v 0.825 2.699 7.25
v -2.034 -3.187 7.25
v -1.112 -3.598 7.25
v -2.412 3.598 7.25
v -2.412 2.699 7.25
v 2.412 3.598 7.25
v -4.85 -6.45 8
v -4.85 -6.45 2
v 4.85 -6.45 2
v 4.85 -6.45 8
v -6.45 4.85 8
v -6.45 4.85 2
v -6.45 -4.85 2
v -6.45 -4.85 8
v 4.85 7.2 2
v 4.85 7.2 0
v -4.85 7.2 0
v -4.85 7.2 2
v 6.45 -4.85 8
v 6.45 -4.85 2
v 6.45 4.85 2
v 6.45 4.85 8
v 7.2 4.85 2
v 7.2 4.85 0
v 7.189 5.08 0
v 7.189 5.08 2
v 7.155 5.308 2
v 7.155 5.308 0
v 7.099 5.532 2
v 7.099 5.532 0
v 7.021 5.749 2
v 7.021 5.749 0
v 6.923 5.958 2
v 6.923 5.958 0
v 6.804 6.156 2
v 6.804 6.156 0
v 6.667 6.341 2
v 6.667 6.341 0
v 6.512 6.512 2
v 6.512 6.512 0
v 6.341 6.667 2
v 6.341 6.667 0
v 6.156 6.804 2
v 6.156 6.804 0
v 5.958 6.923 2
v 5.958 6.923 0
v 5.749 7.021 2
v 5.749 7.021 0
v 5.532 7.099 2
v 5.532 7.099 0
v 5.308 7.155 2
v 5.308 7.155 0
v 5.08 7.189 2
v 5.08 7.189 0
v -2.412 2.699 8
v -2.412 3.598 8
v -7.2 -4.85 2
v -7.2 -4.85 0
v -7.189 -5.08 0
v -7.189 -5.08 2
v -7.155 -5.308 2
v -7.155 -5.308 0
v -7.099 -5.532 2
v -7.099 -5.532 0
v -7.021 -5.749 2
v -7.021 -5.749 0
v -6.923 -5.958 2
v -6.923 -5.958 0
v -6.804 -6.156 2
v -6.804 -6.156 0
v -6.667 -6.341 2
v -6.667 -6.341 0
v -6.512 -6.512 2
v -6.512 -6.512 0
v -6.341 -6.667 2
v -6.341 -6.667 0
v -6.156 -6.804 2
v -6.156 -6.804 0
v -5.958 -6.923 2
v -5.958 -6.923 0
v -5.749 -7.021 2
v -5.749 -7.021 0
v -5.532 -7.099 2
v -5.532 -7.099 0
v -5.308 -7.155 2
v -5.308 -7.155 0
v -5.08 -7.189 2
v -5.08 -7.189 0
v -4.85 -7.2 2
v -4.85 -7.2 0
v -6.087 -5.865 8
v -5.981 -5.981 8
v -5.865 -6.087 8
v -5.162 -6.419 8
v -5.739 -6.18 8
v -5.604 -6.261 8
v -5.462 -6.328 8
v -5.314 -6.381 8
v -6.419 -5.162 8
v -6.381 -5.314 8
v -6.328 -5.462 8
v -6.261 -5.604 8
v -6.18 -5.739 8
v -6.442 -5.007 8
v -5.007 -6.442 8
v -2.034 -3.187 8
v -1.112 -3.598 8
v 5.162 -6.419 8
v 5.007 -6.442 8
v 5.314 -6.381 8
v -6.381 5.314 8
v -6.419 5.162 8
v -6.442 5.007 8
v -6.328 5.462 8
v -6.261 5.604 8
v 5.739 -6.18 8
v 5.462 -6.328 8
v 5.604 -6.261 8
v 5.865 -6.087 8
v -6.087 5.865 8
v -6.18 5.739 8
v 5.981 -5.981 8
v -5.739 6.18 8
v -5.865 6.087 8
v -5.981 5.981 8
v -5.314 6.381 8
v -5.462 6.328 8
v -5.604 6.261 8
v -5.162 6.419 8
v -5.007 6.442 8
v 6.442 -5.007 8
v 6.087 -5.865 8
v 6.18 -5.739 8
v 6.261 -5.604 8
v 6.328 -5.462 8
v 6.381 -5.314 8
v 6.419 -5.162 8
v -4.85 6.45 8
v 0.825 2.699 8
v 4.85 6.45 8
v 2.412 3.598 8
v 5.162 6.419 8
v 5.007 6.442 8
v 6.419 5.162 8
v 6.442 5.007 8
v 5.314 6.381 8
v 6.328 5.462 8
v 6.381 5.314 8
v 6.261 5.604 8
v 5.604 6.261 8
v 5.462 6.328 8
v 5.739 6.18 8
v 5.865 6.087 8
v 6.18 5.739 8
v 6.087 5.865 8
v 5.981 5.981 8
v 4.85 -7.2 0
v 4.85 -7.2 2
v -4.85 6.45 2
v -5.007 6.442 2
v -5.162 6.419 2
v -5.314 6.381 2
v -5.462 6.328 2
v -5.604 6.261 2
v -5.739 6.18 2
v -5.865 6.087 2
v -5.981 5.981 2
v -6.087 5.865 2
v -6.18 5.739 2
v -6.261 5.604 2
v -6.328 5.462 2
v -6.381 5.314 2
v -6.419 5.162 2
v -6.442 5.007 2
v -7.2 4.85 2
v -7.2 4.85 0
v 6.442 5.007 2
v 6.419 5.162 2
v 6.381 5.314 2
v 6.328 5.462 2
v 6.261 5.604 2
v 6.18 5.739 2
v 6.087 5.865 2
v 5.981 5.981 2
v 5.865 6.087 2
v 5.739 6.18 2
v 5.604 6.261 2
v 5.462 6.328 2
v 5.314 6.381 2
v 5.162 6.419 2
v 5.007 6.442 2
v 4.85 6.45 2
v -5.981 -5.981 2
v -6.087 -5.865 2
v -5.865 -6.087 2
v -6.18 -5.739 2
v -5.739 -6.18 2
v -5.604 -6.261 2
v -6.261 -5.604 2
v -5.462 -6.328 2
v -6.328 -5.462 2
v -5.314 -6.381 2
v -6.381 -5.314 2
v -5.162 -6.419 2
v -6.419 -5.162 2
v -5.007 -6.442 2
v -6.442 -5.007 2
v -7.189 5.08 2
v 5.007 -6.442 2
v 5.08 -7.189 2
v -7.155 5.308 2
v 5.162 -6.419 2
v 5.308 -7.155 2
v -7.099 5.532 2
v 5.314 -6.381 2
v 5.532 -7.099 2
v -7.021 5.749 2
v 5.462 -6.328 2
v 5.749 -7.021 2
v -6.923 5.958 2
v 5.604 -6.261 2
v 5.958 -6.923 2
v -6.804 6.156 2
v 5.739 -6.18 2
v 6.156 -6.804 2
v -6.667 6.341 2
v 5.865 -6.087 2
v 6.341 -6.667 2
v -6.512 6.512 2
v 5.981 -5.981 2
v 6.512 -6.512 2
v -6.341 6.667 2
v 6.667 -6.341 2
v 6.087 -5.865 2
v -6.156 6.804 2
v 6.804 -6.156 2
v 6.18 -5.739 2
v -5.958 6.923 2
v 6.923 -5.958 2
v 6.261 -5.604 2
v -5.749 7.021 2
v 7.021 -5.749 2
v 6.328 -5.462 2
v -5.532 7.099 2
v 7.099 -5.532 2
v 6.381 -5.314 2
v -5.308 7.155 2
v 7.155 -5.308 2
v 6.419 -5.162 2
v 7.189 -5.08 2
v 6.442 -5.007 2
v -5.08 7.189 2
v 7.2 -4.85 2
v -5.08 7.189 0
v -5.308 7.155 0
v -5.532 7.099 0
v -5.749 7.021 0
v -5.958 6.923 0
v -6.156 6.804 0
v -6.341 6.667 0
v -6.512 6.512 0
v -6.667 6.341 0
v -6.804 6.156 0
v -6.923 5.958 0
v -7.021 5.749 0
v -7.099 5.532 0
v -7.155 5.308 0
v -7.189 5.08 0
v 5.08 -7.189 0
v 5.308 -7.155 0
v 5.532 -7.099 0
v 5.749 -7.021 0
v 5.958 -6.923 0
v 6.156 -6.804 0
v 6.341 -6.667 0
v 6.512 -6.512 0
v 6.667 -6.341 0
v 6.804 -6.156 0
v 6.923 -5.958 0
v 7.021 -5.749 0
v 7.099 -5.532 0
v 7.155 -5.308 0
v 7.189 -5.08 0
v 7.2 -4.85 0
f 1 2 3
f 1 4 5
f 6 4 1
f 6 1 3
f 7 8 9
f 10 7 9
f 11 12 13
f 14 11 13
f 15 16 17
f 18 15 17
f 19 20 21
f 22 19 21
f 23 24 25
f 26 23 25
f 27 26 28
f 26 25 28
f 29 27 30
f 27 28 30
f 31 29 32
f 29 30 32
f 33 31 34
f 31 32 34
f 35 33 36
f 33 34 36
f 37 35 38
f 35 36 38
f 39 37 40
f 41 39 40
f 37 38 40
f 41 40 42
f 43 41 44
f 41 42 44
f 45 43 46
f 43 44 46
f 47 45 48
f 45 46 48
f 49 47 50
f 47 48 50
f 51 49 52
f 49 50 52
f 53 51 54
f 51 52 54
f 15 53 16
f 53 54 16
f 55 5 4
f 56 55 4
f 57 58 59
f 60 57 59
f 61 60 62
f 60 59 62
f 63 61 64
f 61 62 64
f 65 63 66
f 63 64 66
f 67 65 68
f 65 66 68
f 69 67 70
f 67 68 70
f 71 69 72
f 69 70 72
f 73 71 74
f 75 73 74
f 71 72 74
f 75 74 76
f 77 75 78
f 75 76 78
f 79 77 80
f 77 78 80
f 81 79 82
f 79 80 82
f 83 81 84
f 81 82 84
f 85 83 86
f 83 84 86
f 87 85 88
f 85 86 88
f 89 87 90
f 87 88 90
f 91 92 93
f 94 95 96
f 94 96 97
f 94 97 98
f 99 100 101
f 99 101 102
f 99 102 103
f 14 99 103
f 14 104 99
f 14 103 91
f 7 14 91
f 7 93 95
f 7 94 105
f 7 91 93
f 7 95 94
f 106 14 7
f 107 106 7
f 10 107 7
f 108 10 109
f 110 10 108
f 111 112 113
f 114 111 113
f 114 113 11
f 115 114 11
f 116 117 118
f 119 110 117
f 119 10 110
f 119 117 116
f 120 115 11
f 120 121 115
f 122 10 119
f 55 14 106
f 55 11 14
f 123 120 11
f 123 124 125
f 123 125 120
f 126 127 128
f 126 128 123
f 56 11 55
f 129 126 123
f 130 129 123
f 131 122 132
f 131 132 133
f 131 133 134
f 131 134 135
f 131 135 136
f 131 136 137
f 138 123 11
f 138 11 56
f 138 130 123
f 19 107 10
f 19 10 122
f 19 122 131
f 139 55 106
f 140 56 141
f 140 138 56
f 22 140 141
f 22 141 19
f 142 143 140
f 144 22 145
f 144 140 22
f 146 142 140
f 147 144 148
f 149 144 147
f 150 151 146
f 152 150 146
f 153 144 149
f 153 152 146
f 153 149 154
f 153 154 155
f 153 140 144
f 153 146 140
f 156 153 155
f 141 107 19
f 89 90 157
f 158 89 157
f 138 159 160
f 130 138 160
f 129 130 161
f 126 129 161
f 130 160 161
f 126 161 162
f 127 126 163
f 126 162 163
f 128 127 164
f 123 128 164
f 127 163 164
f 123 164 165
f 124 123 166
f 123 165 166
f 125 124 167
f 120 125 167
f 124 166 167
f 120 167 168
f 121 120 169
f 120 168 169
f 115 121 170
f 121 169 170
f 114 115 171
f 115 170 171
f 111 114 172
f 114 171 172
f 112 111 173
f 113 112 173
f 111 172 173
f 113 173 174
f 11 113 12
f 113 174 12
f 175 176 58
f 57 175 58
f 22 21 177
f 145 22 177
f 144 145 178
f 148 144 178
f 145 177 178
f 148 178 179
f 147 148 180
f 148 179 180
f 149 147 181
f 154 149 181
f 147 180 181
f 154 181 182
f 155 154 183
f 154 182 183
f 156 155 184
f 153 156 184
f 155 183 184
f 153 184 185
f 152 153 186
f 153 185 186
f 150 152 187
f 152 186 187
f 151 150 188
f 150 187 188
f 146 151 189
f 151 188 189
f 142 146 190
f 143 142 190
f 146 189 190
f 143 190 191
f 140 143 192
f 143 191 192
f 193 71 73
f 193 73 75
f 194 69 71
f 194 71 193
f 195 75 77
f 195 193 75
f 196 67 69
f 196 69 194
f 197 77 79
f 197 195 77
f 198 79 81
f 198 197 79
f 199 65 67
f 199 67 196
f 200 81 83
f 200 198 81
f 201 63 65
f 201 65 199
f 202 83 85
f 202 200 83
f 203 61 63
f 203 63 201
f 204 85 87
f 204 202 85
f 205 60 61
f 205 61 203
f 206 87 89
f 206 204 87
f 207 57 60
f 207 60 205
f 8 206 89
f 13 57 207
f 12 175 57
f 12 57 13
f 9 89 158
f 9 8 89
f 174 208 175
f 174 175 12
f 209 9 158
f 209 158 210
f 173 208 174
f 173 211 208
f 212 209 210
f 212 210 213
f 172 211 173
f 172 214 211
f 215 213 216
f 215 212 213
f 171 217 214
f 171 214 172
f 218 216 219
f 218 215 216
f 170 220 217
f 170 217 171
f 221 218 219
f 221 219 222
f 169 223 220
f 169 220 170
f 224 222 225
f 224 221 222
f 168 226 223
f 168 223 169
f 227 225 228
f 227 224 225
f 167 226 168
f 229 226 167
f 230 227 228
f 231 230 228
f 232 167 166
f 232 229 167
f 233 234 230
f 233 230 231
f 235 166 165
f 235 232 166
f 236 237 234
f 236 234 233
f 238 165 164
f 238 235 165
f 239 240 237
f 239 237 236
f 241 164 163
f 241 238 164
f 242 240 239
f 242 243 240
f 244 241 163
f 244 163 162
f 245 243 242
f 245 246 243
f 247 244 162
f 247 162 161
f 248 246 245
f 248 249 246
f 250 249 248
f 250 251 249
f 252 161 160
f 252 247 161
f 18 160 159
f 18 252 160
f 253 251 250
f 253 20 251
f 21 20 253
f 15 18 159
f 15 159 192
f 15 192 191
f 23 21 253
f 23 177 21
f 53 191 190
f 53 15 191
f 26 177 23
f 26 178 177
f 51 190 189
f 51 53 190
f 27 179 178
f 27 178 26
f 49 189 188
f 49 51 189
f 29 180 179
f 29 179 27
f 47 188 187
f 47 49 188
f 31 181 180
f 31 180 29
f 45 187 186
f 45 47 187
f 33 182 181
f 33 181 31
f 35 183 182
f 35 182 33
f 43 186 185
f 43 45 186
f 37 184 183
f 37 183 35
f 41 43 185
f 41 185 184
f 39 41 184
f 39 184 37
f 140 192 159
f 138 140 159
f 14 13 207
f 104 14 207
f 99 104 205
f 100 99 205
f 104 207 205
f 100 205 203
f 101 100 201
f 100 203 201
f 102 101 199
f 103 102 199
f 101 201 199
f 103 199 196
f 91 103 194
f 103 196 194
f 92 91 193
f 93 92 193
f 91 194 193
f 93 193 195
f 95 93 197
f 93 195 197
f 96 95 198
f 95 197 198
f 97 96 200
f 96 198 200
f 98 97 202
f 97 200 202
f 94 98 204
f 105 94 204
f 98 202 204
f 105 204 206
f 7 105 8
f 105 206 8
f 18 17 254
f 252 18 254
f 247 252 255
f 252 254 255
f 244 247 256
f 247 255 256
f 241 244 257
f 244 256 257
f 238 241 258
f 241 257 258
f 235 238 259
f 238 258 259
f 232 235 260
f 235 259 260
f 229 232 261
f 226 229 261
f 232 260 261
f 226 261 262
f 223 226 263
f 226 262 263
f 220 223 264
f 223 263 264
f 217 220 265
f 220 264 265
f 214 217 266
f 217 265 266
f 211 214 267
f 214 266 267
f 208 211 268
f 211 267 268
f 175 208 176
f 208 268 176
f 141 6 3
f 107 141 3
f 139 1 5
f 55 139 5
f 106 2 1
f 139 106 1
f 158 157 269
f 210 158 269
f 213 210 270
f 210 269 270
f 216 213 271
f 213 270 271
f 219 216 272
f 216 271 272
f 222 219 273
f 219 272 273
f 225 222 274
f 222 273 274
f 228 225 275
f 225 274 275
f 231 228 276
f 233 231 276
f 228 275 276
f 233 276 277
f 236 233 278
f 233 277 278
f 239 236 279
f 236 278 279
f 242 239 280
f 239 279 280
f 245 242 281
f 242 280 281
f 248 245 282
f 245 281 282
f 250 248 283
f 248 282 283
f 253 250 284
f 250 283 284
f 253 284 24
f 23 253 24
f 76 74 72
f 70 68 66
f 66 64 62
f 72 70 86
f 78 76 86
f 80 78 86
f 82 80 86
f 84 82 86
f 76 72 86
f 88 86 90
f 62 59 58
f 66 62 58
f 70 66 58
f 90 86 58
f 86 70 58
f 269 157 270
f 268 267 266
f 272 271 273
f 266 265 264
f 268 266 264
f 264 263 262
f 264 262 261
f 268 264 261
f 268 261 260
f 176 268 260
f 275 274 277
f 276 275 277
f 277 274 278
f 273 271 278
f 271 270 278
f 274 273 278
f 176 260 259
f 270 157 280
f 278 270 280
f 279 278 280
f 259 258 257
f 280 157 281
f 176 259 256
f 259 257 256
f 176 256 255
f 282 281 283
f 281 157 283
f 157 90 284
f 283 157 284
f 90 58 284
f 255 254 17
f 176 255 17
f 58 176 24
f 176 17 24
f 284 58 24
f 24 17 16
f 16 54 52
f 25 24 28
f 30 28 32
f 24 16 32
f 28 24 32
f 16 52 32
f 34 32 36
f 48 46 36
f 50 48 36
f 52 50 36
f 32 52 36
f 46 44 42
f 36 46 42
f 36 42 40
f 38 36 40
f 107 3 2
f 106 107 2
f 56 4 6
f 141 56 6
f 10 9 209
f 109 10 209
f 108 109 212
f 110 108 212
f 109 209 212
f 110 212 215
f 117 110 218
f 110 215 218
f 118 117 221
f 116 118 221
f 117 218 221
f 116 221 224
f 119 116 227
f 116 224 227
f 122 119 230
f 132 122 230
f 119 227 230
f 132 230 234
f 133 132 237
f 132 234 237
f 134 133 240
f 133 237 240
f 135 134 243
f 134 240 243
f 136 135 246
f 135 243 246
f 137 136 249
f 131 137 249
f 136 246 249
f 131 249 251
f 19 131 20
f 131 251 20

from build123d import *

# Parameters (mm, degrees)
F1_DEPTH = 2
F2_DEPTH = 8
F3_DEPTH = 7.25


with BuildPart() as f1:
    # F0 (on Top) → F1 (new body)
    with BuildSketch(Plane.XY):
        with BuildLine():
            Line((4.85, 7.2), (-4.85, 7.2))
            ThreePointArc((-4.85, 7.2), (-6.511701, 6.511701), (-7.2, 4.85))
            Line((-7.2, 4.85), (-7.2, -4.85))
            ThreePointArc((-7.2, -4.85), (-6.511701, -6.511701), (-4.85, -7.2))
            Line((-4.85, -7.2), (4.85, -7.2))
            ThreePointArc((4.85, -7.2), (6.511701, -6.511701), (7.2, -4.85))
            Line((7.2, -4.85), (7.2, 4.85))
            ThreePointArc((7.2, 4.85), (6.511701, 6.511701), (4.85, 7.2))
        make_face()
        with BuildLine():
            ThreePointArc((6.45, -4.85), (5.981371, -5.981371), (4.85, -6.45))
            Line((4.85, -6.45), (-4.85, -6.45))
            ThreePointArc((-4.85, -6.45), (-5.981371, -5.981371), (-6.45, -4.85))
            Line((-6.45, -4.85), (-6.45, 4.85))
            ThreePointArc((-6.45, 4.85), (-5.981371, 5.981371), (-4.85, 6.45))
            Line((-4.85, 6.45), (4.85, 6.45))
            ThreePointArc((4.85, 6.45), (5.981371, 5.981371), (6.45, 4.85))
            Line((6.45, 4.85), (6.45, -4.85))
        make_face(mode=Mode.SUBTRACT)
    extrude(amount=F1_DEPTH)

    # F0 (on Top) → F2 (join)
    with BuildSketch(Plane.XY):
        with BuildLine():
            Line((-4.85, -6.45), (4.85, -6.45))
            ThreePointArc((4.85, -6.45), (5.981371, -5.981371), (6.45, -4.85))
            Line((6.45, -4.85), (6.45, 4.85))
            ThreePointArc((6.45, 4.85), (5.981371, 5.981371), (4.85, 6.45))
            Line((4.85, 6.45), (-4.85, 6.45))
            ThreePointArc((-4.85, 6.45), (-5.981371, 5.981371), (-6.45, 4.85))
            Line((-6.45, 4.85), (-6.45, -4.85))
            ThreePointArc((-6.45, -4.85), (-5.981371, -5.981371), (-4.85, -6.45))
        make_face()
        Polygon((-1.11168, -3.598019), (-2.034495, -3.186817), (0.824795, 2.699112), (-2.412227, 2.699112), (-2.412227, 3.598019), (2.412227, 3.598019), align=None, mode=Mode.SUBTRACT)
    extrude(amount=F2_DEPTH)

    # F0 (on Top) → F3 (join)
    with BuildSketch(Plane.XY):
        Polygon((0.824795, 2.699112), (-2.034495, -3.186817), (-1.11168, -3.598019), (2.412227, 3.598019), (-2.412227, 3.598019), (-2.412227, 2.699112), align=None)
    extrude(amount=F3_DEPTH)


solid = f1.part
